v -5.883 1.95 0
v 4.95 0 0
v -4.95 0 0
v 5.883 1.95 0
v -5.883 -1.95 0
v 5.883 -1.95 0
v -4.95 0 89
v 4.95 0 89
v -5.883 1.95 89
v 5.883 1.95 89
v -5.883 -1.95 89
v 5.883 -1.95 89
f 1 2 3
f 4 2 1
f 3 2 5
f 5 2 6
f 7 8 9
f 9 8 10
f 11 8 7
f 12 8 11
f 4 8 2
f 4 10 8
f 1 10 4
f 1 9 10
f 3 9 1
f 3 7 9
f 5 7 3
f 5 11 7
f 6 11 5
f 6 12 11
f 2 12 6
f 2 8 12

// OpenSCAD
// Connector Strip for Modular Shelf System
// Slides into the back-to-back dovetail tracks of two adjacent shelf pieces.
// Bowtie/hourglass cross-section locks into dovetail grooves to prevent pull-apart.
// Print flat on the bed for best strength.
// Units: millimeters
//
// IMPORTANT: track_width, track_depth, and dovetail_angle must match shelf.scad

// --- Track Parameters (must match shelf.scad) ---
track_width      = 10;   // width of groove at wall surface
track_depth      = 2;    // depth of groove in the shelf
track_length_pct = 75;   // percentage of shelf depth covered by groove
shelf_depth      = 120;  // depth of the shelf (to derive track length)
dovetail_angle   = 25;   // degrees from vertical (must match shelf.scad)

// --- FDM Tolerances ---
clearance = 0.05;  // clearance per side for FDM fit

// --- Derived Dimensions ---
track_length    = shelf_depth * track_length_pct / 100;
strip_length    = track_length - 1;  // 1mm shorter for easy insertion
dovetail_extra  = track_depth * tan(dovetail_angle);
half_thickness  = track_depth - clearance;
narrow_half_w   = (track_width - 2 * clearance) / 2;
wide_half_w     = narrow_half_w + dovetail_extra;

$fn = 180;

// Bowtie cross-section: wide at top and bottom edges, narrow at center
module connector_strip() {
    linear_extrude(height = strip_length)
        polygon([
            [-wide_half_w,   -half_thickness],  // bottom-left (wide, locks in shelf A)
            [ wide_half_w,   -half_thickness],  // bottom-right (wide)
            [ narrow_half_w,  0],               // center-right (narrow pinch at joint)
            [ wide_half_w,    half_thickness],  // top-right (wide, locks in shelf B)
            [-wide_half_w,    half_thickness],  // top-left (wide)
            [-narrow_half_w,  0]                // center-left (narrow pinch at joint)
        ]);
}

connector_strip();
